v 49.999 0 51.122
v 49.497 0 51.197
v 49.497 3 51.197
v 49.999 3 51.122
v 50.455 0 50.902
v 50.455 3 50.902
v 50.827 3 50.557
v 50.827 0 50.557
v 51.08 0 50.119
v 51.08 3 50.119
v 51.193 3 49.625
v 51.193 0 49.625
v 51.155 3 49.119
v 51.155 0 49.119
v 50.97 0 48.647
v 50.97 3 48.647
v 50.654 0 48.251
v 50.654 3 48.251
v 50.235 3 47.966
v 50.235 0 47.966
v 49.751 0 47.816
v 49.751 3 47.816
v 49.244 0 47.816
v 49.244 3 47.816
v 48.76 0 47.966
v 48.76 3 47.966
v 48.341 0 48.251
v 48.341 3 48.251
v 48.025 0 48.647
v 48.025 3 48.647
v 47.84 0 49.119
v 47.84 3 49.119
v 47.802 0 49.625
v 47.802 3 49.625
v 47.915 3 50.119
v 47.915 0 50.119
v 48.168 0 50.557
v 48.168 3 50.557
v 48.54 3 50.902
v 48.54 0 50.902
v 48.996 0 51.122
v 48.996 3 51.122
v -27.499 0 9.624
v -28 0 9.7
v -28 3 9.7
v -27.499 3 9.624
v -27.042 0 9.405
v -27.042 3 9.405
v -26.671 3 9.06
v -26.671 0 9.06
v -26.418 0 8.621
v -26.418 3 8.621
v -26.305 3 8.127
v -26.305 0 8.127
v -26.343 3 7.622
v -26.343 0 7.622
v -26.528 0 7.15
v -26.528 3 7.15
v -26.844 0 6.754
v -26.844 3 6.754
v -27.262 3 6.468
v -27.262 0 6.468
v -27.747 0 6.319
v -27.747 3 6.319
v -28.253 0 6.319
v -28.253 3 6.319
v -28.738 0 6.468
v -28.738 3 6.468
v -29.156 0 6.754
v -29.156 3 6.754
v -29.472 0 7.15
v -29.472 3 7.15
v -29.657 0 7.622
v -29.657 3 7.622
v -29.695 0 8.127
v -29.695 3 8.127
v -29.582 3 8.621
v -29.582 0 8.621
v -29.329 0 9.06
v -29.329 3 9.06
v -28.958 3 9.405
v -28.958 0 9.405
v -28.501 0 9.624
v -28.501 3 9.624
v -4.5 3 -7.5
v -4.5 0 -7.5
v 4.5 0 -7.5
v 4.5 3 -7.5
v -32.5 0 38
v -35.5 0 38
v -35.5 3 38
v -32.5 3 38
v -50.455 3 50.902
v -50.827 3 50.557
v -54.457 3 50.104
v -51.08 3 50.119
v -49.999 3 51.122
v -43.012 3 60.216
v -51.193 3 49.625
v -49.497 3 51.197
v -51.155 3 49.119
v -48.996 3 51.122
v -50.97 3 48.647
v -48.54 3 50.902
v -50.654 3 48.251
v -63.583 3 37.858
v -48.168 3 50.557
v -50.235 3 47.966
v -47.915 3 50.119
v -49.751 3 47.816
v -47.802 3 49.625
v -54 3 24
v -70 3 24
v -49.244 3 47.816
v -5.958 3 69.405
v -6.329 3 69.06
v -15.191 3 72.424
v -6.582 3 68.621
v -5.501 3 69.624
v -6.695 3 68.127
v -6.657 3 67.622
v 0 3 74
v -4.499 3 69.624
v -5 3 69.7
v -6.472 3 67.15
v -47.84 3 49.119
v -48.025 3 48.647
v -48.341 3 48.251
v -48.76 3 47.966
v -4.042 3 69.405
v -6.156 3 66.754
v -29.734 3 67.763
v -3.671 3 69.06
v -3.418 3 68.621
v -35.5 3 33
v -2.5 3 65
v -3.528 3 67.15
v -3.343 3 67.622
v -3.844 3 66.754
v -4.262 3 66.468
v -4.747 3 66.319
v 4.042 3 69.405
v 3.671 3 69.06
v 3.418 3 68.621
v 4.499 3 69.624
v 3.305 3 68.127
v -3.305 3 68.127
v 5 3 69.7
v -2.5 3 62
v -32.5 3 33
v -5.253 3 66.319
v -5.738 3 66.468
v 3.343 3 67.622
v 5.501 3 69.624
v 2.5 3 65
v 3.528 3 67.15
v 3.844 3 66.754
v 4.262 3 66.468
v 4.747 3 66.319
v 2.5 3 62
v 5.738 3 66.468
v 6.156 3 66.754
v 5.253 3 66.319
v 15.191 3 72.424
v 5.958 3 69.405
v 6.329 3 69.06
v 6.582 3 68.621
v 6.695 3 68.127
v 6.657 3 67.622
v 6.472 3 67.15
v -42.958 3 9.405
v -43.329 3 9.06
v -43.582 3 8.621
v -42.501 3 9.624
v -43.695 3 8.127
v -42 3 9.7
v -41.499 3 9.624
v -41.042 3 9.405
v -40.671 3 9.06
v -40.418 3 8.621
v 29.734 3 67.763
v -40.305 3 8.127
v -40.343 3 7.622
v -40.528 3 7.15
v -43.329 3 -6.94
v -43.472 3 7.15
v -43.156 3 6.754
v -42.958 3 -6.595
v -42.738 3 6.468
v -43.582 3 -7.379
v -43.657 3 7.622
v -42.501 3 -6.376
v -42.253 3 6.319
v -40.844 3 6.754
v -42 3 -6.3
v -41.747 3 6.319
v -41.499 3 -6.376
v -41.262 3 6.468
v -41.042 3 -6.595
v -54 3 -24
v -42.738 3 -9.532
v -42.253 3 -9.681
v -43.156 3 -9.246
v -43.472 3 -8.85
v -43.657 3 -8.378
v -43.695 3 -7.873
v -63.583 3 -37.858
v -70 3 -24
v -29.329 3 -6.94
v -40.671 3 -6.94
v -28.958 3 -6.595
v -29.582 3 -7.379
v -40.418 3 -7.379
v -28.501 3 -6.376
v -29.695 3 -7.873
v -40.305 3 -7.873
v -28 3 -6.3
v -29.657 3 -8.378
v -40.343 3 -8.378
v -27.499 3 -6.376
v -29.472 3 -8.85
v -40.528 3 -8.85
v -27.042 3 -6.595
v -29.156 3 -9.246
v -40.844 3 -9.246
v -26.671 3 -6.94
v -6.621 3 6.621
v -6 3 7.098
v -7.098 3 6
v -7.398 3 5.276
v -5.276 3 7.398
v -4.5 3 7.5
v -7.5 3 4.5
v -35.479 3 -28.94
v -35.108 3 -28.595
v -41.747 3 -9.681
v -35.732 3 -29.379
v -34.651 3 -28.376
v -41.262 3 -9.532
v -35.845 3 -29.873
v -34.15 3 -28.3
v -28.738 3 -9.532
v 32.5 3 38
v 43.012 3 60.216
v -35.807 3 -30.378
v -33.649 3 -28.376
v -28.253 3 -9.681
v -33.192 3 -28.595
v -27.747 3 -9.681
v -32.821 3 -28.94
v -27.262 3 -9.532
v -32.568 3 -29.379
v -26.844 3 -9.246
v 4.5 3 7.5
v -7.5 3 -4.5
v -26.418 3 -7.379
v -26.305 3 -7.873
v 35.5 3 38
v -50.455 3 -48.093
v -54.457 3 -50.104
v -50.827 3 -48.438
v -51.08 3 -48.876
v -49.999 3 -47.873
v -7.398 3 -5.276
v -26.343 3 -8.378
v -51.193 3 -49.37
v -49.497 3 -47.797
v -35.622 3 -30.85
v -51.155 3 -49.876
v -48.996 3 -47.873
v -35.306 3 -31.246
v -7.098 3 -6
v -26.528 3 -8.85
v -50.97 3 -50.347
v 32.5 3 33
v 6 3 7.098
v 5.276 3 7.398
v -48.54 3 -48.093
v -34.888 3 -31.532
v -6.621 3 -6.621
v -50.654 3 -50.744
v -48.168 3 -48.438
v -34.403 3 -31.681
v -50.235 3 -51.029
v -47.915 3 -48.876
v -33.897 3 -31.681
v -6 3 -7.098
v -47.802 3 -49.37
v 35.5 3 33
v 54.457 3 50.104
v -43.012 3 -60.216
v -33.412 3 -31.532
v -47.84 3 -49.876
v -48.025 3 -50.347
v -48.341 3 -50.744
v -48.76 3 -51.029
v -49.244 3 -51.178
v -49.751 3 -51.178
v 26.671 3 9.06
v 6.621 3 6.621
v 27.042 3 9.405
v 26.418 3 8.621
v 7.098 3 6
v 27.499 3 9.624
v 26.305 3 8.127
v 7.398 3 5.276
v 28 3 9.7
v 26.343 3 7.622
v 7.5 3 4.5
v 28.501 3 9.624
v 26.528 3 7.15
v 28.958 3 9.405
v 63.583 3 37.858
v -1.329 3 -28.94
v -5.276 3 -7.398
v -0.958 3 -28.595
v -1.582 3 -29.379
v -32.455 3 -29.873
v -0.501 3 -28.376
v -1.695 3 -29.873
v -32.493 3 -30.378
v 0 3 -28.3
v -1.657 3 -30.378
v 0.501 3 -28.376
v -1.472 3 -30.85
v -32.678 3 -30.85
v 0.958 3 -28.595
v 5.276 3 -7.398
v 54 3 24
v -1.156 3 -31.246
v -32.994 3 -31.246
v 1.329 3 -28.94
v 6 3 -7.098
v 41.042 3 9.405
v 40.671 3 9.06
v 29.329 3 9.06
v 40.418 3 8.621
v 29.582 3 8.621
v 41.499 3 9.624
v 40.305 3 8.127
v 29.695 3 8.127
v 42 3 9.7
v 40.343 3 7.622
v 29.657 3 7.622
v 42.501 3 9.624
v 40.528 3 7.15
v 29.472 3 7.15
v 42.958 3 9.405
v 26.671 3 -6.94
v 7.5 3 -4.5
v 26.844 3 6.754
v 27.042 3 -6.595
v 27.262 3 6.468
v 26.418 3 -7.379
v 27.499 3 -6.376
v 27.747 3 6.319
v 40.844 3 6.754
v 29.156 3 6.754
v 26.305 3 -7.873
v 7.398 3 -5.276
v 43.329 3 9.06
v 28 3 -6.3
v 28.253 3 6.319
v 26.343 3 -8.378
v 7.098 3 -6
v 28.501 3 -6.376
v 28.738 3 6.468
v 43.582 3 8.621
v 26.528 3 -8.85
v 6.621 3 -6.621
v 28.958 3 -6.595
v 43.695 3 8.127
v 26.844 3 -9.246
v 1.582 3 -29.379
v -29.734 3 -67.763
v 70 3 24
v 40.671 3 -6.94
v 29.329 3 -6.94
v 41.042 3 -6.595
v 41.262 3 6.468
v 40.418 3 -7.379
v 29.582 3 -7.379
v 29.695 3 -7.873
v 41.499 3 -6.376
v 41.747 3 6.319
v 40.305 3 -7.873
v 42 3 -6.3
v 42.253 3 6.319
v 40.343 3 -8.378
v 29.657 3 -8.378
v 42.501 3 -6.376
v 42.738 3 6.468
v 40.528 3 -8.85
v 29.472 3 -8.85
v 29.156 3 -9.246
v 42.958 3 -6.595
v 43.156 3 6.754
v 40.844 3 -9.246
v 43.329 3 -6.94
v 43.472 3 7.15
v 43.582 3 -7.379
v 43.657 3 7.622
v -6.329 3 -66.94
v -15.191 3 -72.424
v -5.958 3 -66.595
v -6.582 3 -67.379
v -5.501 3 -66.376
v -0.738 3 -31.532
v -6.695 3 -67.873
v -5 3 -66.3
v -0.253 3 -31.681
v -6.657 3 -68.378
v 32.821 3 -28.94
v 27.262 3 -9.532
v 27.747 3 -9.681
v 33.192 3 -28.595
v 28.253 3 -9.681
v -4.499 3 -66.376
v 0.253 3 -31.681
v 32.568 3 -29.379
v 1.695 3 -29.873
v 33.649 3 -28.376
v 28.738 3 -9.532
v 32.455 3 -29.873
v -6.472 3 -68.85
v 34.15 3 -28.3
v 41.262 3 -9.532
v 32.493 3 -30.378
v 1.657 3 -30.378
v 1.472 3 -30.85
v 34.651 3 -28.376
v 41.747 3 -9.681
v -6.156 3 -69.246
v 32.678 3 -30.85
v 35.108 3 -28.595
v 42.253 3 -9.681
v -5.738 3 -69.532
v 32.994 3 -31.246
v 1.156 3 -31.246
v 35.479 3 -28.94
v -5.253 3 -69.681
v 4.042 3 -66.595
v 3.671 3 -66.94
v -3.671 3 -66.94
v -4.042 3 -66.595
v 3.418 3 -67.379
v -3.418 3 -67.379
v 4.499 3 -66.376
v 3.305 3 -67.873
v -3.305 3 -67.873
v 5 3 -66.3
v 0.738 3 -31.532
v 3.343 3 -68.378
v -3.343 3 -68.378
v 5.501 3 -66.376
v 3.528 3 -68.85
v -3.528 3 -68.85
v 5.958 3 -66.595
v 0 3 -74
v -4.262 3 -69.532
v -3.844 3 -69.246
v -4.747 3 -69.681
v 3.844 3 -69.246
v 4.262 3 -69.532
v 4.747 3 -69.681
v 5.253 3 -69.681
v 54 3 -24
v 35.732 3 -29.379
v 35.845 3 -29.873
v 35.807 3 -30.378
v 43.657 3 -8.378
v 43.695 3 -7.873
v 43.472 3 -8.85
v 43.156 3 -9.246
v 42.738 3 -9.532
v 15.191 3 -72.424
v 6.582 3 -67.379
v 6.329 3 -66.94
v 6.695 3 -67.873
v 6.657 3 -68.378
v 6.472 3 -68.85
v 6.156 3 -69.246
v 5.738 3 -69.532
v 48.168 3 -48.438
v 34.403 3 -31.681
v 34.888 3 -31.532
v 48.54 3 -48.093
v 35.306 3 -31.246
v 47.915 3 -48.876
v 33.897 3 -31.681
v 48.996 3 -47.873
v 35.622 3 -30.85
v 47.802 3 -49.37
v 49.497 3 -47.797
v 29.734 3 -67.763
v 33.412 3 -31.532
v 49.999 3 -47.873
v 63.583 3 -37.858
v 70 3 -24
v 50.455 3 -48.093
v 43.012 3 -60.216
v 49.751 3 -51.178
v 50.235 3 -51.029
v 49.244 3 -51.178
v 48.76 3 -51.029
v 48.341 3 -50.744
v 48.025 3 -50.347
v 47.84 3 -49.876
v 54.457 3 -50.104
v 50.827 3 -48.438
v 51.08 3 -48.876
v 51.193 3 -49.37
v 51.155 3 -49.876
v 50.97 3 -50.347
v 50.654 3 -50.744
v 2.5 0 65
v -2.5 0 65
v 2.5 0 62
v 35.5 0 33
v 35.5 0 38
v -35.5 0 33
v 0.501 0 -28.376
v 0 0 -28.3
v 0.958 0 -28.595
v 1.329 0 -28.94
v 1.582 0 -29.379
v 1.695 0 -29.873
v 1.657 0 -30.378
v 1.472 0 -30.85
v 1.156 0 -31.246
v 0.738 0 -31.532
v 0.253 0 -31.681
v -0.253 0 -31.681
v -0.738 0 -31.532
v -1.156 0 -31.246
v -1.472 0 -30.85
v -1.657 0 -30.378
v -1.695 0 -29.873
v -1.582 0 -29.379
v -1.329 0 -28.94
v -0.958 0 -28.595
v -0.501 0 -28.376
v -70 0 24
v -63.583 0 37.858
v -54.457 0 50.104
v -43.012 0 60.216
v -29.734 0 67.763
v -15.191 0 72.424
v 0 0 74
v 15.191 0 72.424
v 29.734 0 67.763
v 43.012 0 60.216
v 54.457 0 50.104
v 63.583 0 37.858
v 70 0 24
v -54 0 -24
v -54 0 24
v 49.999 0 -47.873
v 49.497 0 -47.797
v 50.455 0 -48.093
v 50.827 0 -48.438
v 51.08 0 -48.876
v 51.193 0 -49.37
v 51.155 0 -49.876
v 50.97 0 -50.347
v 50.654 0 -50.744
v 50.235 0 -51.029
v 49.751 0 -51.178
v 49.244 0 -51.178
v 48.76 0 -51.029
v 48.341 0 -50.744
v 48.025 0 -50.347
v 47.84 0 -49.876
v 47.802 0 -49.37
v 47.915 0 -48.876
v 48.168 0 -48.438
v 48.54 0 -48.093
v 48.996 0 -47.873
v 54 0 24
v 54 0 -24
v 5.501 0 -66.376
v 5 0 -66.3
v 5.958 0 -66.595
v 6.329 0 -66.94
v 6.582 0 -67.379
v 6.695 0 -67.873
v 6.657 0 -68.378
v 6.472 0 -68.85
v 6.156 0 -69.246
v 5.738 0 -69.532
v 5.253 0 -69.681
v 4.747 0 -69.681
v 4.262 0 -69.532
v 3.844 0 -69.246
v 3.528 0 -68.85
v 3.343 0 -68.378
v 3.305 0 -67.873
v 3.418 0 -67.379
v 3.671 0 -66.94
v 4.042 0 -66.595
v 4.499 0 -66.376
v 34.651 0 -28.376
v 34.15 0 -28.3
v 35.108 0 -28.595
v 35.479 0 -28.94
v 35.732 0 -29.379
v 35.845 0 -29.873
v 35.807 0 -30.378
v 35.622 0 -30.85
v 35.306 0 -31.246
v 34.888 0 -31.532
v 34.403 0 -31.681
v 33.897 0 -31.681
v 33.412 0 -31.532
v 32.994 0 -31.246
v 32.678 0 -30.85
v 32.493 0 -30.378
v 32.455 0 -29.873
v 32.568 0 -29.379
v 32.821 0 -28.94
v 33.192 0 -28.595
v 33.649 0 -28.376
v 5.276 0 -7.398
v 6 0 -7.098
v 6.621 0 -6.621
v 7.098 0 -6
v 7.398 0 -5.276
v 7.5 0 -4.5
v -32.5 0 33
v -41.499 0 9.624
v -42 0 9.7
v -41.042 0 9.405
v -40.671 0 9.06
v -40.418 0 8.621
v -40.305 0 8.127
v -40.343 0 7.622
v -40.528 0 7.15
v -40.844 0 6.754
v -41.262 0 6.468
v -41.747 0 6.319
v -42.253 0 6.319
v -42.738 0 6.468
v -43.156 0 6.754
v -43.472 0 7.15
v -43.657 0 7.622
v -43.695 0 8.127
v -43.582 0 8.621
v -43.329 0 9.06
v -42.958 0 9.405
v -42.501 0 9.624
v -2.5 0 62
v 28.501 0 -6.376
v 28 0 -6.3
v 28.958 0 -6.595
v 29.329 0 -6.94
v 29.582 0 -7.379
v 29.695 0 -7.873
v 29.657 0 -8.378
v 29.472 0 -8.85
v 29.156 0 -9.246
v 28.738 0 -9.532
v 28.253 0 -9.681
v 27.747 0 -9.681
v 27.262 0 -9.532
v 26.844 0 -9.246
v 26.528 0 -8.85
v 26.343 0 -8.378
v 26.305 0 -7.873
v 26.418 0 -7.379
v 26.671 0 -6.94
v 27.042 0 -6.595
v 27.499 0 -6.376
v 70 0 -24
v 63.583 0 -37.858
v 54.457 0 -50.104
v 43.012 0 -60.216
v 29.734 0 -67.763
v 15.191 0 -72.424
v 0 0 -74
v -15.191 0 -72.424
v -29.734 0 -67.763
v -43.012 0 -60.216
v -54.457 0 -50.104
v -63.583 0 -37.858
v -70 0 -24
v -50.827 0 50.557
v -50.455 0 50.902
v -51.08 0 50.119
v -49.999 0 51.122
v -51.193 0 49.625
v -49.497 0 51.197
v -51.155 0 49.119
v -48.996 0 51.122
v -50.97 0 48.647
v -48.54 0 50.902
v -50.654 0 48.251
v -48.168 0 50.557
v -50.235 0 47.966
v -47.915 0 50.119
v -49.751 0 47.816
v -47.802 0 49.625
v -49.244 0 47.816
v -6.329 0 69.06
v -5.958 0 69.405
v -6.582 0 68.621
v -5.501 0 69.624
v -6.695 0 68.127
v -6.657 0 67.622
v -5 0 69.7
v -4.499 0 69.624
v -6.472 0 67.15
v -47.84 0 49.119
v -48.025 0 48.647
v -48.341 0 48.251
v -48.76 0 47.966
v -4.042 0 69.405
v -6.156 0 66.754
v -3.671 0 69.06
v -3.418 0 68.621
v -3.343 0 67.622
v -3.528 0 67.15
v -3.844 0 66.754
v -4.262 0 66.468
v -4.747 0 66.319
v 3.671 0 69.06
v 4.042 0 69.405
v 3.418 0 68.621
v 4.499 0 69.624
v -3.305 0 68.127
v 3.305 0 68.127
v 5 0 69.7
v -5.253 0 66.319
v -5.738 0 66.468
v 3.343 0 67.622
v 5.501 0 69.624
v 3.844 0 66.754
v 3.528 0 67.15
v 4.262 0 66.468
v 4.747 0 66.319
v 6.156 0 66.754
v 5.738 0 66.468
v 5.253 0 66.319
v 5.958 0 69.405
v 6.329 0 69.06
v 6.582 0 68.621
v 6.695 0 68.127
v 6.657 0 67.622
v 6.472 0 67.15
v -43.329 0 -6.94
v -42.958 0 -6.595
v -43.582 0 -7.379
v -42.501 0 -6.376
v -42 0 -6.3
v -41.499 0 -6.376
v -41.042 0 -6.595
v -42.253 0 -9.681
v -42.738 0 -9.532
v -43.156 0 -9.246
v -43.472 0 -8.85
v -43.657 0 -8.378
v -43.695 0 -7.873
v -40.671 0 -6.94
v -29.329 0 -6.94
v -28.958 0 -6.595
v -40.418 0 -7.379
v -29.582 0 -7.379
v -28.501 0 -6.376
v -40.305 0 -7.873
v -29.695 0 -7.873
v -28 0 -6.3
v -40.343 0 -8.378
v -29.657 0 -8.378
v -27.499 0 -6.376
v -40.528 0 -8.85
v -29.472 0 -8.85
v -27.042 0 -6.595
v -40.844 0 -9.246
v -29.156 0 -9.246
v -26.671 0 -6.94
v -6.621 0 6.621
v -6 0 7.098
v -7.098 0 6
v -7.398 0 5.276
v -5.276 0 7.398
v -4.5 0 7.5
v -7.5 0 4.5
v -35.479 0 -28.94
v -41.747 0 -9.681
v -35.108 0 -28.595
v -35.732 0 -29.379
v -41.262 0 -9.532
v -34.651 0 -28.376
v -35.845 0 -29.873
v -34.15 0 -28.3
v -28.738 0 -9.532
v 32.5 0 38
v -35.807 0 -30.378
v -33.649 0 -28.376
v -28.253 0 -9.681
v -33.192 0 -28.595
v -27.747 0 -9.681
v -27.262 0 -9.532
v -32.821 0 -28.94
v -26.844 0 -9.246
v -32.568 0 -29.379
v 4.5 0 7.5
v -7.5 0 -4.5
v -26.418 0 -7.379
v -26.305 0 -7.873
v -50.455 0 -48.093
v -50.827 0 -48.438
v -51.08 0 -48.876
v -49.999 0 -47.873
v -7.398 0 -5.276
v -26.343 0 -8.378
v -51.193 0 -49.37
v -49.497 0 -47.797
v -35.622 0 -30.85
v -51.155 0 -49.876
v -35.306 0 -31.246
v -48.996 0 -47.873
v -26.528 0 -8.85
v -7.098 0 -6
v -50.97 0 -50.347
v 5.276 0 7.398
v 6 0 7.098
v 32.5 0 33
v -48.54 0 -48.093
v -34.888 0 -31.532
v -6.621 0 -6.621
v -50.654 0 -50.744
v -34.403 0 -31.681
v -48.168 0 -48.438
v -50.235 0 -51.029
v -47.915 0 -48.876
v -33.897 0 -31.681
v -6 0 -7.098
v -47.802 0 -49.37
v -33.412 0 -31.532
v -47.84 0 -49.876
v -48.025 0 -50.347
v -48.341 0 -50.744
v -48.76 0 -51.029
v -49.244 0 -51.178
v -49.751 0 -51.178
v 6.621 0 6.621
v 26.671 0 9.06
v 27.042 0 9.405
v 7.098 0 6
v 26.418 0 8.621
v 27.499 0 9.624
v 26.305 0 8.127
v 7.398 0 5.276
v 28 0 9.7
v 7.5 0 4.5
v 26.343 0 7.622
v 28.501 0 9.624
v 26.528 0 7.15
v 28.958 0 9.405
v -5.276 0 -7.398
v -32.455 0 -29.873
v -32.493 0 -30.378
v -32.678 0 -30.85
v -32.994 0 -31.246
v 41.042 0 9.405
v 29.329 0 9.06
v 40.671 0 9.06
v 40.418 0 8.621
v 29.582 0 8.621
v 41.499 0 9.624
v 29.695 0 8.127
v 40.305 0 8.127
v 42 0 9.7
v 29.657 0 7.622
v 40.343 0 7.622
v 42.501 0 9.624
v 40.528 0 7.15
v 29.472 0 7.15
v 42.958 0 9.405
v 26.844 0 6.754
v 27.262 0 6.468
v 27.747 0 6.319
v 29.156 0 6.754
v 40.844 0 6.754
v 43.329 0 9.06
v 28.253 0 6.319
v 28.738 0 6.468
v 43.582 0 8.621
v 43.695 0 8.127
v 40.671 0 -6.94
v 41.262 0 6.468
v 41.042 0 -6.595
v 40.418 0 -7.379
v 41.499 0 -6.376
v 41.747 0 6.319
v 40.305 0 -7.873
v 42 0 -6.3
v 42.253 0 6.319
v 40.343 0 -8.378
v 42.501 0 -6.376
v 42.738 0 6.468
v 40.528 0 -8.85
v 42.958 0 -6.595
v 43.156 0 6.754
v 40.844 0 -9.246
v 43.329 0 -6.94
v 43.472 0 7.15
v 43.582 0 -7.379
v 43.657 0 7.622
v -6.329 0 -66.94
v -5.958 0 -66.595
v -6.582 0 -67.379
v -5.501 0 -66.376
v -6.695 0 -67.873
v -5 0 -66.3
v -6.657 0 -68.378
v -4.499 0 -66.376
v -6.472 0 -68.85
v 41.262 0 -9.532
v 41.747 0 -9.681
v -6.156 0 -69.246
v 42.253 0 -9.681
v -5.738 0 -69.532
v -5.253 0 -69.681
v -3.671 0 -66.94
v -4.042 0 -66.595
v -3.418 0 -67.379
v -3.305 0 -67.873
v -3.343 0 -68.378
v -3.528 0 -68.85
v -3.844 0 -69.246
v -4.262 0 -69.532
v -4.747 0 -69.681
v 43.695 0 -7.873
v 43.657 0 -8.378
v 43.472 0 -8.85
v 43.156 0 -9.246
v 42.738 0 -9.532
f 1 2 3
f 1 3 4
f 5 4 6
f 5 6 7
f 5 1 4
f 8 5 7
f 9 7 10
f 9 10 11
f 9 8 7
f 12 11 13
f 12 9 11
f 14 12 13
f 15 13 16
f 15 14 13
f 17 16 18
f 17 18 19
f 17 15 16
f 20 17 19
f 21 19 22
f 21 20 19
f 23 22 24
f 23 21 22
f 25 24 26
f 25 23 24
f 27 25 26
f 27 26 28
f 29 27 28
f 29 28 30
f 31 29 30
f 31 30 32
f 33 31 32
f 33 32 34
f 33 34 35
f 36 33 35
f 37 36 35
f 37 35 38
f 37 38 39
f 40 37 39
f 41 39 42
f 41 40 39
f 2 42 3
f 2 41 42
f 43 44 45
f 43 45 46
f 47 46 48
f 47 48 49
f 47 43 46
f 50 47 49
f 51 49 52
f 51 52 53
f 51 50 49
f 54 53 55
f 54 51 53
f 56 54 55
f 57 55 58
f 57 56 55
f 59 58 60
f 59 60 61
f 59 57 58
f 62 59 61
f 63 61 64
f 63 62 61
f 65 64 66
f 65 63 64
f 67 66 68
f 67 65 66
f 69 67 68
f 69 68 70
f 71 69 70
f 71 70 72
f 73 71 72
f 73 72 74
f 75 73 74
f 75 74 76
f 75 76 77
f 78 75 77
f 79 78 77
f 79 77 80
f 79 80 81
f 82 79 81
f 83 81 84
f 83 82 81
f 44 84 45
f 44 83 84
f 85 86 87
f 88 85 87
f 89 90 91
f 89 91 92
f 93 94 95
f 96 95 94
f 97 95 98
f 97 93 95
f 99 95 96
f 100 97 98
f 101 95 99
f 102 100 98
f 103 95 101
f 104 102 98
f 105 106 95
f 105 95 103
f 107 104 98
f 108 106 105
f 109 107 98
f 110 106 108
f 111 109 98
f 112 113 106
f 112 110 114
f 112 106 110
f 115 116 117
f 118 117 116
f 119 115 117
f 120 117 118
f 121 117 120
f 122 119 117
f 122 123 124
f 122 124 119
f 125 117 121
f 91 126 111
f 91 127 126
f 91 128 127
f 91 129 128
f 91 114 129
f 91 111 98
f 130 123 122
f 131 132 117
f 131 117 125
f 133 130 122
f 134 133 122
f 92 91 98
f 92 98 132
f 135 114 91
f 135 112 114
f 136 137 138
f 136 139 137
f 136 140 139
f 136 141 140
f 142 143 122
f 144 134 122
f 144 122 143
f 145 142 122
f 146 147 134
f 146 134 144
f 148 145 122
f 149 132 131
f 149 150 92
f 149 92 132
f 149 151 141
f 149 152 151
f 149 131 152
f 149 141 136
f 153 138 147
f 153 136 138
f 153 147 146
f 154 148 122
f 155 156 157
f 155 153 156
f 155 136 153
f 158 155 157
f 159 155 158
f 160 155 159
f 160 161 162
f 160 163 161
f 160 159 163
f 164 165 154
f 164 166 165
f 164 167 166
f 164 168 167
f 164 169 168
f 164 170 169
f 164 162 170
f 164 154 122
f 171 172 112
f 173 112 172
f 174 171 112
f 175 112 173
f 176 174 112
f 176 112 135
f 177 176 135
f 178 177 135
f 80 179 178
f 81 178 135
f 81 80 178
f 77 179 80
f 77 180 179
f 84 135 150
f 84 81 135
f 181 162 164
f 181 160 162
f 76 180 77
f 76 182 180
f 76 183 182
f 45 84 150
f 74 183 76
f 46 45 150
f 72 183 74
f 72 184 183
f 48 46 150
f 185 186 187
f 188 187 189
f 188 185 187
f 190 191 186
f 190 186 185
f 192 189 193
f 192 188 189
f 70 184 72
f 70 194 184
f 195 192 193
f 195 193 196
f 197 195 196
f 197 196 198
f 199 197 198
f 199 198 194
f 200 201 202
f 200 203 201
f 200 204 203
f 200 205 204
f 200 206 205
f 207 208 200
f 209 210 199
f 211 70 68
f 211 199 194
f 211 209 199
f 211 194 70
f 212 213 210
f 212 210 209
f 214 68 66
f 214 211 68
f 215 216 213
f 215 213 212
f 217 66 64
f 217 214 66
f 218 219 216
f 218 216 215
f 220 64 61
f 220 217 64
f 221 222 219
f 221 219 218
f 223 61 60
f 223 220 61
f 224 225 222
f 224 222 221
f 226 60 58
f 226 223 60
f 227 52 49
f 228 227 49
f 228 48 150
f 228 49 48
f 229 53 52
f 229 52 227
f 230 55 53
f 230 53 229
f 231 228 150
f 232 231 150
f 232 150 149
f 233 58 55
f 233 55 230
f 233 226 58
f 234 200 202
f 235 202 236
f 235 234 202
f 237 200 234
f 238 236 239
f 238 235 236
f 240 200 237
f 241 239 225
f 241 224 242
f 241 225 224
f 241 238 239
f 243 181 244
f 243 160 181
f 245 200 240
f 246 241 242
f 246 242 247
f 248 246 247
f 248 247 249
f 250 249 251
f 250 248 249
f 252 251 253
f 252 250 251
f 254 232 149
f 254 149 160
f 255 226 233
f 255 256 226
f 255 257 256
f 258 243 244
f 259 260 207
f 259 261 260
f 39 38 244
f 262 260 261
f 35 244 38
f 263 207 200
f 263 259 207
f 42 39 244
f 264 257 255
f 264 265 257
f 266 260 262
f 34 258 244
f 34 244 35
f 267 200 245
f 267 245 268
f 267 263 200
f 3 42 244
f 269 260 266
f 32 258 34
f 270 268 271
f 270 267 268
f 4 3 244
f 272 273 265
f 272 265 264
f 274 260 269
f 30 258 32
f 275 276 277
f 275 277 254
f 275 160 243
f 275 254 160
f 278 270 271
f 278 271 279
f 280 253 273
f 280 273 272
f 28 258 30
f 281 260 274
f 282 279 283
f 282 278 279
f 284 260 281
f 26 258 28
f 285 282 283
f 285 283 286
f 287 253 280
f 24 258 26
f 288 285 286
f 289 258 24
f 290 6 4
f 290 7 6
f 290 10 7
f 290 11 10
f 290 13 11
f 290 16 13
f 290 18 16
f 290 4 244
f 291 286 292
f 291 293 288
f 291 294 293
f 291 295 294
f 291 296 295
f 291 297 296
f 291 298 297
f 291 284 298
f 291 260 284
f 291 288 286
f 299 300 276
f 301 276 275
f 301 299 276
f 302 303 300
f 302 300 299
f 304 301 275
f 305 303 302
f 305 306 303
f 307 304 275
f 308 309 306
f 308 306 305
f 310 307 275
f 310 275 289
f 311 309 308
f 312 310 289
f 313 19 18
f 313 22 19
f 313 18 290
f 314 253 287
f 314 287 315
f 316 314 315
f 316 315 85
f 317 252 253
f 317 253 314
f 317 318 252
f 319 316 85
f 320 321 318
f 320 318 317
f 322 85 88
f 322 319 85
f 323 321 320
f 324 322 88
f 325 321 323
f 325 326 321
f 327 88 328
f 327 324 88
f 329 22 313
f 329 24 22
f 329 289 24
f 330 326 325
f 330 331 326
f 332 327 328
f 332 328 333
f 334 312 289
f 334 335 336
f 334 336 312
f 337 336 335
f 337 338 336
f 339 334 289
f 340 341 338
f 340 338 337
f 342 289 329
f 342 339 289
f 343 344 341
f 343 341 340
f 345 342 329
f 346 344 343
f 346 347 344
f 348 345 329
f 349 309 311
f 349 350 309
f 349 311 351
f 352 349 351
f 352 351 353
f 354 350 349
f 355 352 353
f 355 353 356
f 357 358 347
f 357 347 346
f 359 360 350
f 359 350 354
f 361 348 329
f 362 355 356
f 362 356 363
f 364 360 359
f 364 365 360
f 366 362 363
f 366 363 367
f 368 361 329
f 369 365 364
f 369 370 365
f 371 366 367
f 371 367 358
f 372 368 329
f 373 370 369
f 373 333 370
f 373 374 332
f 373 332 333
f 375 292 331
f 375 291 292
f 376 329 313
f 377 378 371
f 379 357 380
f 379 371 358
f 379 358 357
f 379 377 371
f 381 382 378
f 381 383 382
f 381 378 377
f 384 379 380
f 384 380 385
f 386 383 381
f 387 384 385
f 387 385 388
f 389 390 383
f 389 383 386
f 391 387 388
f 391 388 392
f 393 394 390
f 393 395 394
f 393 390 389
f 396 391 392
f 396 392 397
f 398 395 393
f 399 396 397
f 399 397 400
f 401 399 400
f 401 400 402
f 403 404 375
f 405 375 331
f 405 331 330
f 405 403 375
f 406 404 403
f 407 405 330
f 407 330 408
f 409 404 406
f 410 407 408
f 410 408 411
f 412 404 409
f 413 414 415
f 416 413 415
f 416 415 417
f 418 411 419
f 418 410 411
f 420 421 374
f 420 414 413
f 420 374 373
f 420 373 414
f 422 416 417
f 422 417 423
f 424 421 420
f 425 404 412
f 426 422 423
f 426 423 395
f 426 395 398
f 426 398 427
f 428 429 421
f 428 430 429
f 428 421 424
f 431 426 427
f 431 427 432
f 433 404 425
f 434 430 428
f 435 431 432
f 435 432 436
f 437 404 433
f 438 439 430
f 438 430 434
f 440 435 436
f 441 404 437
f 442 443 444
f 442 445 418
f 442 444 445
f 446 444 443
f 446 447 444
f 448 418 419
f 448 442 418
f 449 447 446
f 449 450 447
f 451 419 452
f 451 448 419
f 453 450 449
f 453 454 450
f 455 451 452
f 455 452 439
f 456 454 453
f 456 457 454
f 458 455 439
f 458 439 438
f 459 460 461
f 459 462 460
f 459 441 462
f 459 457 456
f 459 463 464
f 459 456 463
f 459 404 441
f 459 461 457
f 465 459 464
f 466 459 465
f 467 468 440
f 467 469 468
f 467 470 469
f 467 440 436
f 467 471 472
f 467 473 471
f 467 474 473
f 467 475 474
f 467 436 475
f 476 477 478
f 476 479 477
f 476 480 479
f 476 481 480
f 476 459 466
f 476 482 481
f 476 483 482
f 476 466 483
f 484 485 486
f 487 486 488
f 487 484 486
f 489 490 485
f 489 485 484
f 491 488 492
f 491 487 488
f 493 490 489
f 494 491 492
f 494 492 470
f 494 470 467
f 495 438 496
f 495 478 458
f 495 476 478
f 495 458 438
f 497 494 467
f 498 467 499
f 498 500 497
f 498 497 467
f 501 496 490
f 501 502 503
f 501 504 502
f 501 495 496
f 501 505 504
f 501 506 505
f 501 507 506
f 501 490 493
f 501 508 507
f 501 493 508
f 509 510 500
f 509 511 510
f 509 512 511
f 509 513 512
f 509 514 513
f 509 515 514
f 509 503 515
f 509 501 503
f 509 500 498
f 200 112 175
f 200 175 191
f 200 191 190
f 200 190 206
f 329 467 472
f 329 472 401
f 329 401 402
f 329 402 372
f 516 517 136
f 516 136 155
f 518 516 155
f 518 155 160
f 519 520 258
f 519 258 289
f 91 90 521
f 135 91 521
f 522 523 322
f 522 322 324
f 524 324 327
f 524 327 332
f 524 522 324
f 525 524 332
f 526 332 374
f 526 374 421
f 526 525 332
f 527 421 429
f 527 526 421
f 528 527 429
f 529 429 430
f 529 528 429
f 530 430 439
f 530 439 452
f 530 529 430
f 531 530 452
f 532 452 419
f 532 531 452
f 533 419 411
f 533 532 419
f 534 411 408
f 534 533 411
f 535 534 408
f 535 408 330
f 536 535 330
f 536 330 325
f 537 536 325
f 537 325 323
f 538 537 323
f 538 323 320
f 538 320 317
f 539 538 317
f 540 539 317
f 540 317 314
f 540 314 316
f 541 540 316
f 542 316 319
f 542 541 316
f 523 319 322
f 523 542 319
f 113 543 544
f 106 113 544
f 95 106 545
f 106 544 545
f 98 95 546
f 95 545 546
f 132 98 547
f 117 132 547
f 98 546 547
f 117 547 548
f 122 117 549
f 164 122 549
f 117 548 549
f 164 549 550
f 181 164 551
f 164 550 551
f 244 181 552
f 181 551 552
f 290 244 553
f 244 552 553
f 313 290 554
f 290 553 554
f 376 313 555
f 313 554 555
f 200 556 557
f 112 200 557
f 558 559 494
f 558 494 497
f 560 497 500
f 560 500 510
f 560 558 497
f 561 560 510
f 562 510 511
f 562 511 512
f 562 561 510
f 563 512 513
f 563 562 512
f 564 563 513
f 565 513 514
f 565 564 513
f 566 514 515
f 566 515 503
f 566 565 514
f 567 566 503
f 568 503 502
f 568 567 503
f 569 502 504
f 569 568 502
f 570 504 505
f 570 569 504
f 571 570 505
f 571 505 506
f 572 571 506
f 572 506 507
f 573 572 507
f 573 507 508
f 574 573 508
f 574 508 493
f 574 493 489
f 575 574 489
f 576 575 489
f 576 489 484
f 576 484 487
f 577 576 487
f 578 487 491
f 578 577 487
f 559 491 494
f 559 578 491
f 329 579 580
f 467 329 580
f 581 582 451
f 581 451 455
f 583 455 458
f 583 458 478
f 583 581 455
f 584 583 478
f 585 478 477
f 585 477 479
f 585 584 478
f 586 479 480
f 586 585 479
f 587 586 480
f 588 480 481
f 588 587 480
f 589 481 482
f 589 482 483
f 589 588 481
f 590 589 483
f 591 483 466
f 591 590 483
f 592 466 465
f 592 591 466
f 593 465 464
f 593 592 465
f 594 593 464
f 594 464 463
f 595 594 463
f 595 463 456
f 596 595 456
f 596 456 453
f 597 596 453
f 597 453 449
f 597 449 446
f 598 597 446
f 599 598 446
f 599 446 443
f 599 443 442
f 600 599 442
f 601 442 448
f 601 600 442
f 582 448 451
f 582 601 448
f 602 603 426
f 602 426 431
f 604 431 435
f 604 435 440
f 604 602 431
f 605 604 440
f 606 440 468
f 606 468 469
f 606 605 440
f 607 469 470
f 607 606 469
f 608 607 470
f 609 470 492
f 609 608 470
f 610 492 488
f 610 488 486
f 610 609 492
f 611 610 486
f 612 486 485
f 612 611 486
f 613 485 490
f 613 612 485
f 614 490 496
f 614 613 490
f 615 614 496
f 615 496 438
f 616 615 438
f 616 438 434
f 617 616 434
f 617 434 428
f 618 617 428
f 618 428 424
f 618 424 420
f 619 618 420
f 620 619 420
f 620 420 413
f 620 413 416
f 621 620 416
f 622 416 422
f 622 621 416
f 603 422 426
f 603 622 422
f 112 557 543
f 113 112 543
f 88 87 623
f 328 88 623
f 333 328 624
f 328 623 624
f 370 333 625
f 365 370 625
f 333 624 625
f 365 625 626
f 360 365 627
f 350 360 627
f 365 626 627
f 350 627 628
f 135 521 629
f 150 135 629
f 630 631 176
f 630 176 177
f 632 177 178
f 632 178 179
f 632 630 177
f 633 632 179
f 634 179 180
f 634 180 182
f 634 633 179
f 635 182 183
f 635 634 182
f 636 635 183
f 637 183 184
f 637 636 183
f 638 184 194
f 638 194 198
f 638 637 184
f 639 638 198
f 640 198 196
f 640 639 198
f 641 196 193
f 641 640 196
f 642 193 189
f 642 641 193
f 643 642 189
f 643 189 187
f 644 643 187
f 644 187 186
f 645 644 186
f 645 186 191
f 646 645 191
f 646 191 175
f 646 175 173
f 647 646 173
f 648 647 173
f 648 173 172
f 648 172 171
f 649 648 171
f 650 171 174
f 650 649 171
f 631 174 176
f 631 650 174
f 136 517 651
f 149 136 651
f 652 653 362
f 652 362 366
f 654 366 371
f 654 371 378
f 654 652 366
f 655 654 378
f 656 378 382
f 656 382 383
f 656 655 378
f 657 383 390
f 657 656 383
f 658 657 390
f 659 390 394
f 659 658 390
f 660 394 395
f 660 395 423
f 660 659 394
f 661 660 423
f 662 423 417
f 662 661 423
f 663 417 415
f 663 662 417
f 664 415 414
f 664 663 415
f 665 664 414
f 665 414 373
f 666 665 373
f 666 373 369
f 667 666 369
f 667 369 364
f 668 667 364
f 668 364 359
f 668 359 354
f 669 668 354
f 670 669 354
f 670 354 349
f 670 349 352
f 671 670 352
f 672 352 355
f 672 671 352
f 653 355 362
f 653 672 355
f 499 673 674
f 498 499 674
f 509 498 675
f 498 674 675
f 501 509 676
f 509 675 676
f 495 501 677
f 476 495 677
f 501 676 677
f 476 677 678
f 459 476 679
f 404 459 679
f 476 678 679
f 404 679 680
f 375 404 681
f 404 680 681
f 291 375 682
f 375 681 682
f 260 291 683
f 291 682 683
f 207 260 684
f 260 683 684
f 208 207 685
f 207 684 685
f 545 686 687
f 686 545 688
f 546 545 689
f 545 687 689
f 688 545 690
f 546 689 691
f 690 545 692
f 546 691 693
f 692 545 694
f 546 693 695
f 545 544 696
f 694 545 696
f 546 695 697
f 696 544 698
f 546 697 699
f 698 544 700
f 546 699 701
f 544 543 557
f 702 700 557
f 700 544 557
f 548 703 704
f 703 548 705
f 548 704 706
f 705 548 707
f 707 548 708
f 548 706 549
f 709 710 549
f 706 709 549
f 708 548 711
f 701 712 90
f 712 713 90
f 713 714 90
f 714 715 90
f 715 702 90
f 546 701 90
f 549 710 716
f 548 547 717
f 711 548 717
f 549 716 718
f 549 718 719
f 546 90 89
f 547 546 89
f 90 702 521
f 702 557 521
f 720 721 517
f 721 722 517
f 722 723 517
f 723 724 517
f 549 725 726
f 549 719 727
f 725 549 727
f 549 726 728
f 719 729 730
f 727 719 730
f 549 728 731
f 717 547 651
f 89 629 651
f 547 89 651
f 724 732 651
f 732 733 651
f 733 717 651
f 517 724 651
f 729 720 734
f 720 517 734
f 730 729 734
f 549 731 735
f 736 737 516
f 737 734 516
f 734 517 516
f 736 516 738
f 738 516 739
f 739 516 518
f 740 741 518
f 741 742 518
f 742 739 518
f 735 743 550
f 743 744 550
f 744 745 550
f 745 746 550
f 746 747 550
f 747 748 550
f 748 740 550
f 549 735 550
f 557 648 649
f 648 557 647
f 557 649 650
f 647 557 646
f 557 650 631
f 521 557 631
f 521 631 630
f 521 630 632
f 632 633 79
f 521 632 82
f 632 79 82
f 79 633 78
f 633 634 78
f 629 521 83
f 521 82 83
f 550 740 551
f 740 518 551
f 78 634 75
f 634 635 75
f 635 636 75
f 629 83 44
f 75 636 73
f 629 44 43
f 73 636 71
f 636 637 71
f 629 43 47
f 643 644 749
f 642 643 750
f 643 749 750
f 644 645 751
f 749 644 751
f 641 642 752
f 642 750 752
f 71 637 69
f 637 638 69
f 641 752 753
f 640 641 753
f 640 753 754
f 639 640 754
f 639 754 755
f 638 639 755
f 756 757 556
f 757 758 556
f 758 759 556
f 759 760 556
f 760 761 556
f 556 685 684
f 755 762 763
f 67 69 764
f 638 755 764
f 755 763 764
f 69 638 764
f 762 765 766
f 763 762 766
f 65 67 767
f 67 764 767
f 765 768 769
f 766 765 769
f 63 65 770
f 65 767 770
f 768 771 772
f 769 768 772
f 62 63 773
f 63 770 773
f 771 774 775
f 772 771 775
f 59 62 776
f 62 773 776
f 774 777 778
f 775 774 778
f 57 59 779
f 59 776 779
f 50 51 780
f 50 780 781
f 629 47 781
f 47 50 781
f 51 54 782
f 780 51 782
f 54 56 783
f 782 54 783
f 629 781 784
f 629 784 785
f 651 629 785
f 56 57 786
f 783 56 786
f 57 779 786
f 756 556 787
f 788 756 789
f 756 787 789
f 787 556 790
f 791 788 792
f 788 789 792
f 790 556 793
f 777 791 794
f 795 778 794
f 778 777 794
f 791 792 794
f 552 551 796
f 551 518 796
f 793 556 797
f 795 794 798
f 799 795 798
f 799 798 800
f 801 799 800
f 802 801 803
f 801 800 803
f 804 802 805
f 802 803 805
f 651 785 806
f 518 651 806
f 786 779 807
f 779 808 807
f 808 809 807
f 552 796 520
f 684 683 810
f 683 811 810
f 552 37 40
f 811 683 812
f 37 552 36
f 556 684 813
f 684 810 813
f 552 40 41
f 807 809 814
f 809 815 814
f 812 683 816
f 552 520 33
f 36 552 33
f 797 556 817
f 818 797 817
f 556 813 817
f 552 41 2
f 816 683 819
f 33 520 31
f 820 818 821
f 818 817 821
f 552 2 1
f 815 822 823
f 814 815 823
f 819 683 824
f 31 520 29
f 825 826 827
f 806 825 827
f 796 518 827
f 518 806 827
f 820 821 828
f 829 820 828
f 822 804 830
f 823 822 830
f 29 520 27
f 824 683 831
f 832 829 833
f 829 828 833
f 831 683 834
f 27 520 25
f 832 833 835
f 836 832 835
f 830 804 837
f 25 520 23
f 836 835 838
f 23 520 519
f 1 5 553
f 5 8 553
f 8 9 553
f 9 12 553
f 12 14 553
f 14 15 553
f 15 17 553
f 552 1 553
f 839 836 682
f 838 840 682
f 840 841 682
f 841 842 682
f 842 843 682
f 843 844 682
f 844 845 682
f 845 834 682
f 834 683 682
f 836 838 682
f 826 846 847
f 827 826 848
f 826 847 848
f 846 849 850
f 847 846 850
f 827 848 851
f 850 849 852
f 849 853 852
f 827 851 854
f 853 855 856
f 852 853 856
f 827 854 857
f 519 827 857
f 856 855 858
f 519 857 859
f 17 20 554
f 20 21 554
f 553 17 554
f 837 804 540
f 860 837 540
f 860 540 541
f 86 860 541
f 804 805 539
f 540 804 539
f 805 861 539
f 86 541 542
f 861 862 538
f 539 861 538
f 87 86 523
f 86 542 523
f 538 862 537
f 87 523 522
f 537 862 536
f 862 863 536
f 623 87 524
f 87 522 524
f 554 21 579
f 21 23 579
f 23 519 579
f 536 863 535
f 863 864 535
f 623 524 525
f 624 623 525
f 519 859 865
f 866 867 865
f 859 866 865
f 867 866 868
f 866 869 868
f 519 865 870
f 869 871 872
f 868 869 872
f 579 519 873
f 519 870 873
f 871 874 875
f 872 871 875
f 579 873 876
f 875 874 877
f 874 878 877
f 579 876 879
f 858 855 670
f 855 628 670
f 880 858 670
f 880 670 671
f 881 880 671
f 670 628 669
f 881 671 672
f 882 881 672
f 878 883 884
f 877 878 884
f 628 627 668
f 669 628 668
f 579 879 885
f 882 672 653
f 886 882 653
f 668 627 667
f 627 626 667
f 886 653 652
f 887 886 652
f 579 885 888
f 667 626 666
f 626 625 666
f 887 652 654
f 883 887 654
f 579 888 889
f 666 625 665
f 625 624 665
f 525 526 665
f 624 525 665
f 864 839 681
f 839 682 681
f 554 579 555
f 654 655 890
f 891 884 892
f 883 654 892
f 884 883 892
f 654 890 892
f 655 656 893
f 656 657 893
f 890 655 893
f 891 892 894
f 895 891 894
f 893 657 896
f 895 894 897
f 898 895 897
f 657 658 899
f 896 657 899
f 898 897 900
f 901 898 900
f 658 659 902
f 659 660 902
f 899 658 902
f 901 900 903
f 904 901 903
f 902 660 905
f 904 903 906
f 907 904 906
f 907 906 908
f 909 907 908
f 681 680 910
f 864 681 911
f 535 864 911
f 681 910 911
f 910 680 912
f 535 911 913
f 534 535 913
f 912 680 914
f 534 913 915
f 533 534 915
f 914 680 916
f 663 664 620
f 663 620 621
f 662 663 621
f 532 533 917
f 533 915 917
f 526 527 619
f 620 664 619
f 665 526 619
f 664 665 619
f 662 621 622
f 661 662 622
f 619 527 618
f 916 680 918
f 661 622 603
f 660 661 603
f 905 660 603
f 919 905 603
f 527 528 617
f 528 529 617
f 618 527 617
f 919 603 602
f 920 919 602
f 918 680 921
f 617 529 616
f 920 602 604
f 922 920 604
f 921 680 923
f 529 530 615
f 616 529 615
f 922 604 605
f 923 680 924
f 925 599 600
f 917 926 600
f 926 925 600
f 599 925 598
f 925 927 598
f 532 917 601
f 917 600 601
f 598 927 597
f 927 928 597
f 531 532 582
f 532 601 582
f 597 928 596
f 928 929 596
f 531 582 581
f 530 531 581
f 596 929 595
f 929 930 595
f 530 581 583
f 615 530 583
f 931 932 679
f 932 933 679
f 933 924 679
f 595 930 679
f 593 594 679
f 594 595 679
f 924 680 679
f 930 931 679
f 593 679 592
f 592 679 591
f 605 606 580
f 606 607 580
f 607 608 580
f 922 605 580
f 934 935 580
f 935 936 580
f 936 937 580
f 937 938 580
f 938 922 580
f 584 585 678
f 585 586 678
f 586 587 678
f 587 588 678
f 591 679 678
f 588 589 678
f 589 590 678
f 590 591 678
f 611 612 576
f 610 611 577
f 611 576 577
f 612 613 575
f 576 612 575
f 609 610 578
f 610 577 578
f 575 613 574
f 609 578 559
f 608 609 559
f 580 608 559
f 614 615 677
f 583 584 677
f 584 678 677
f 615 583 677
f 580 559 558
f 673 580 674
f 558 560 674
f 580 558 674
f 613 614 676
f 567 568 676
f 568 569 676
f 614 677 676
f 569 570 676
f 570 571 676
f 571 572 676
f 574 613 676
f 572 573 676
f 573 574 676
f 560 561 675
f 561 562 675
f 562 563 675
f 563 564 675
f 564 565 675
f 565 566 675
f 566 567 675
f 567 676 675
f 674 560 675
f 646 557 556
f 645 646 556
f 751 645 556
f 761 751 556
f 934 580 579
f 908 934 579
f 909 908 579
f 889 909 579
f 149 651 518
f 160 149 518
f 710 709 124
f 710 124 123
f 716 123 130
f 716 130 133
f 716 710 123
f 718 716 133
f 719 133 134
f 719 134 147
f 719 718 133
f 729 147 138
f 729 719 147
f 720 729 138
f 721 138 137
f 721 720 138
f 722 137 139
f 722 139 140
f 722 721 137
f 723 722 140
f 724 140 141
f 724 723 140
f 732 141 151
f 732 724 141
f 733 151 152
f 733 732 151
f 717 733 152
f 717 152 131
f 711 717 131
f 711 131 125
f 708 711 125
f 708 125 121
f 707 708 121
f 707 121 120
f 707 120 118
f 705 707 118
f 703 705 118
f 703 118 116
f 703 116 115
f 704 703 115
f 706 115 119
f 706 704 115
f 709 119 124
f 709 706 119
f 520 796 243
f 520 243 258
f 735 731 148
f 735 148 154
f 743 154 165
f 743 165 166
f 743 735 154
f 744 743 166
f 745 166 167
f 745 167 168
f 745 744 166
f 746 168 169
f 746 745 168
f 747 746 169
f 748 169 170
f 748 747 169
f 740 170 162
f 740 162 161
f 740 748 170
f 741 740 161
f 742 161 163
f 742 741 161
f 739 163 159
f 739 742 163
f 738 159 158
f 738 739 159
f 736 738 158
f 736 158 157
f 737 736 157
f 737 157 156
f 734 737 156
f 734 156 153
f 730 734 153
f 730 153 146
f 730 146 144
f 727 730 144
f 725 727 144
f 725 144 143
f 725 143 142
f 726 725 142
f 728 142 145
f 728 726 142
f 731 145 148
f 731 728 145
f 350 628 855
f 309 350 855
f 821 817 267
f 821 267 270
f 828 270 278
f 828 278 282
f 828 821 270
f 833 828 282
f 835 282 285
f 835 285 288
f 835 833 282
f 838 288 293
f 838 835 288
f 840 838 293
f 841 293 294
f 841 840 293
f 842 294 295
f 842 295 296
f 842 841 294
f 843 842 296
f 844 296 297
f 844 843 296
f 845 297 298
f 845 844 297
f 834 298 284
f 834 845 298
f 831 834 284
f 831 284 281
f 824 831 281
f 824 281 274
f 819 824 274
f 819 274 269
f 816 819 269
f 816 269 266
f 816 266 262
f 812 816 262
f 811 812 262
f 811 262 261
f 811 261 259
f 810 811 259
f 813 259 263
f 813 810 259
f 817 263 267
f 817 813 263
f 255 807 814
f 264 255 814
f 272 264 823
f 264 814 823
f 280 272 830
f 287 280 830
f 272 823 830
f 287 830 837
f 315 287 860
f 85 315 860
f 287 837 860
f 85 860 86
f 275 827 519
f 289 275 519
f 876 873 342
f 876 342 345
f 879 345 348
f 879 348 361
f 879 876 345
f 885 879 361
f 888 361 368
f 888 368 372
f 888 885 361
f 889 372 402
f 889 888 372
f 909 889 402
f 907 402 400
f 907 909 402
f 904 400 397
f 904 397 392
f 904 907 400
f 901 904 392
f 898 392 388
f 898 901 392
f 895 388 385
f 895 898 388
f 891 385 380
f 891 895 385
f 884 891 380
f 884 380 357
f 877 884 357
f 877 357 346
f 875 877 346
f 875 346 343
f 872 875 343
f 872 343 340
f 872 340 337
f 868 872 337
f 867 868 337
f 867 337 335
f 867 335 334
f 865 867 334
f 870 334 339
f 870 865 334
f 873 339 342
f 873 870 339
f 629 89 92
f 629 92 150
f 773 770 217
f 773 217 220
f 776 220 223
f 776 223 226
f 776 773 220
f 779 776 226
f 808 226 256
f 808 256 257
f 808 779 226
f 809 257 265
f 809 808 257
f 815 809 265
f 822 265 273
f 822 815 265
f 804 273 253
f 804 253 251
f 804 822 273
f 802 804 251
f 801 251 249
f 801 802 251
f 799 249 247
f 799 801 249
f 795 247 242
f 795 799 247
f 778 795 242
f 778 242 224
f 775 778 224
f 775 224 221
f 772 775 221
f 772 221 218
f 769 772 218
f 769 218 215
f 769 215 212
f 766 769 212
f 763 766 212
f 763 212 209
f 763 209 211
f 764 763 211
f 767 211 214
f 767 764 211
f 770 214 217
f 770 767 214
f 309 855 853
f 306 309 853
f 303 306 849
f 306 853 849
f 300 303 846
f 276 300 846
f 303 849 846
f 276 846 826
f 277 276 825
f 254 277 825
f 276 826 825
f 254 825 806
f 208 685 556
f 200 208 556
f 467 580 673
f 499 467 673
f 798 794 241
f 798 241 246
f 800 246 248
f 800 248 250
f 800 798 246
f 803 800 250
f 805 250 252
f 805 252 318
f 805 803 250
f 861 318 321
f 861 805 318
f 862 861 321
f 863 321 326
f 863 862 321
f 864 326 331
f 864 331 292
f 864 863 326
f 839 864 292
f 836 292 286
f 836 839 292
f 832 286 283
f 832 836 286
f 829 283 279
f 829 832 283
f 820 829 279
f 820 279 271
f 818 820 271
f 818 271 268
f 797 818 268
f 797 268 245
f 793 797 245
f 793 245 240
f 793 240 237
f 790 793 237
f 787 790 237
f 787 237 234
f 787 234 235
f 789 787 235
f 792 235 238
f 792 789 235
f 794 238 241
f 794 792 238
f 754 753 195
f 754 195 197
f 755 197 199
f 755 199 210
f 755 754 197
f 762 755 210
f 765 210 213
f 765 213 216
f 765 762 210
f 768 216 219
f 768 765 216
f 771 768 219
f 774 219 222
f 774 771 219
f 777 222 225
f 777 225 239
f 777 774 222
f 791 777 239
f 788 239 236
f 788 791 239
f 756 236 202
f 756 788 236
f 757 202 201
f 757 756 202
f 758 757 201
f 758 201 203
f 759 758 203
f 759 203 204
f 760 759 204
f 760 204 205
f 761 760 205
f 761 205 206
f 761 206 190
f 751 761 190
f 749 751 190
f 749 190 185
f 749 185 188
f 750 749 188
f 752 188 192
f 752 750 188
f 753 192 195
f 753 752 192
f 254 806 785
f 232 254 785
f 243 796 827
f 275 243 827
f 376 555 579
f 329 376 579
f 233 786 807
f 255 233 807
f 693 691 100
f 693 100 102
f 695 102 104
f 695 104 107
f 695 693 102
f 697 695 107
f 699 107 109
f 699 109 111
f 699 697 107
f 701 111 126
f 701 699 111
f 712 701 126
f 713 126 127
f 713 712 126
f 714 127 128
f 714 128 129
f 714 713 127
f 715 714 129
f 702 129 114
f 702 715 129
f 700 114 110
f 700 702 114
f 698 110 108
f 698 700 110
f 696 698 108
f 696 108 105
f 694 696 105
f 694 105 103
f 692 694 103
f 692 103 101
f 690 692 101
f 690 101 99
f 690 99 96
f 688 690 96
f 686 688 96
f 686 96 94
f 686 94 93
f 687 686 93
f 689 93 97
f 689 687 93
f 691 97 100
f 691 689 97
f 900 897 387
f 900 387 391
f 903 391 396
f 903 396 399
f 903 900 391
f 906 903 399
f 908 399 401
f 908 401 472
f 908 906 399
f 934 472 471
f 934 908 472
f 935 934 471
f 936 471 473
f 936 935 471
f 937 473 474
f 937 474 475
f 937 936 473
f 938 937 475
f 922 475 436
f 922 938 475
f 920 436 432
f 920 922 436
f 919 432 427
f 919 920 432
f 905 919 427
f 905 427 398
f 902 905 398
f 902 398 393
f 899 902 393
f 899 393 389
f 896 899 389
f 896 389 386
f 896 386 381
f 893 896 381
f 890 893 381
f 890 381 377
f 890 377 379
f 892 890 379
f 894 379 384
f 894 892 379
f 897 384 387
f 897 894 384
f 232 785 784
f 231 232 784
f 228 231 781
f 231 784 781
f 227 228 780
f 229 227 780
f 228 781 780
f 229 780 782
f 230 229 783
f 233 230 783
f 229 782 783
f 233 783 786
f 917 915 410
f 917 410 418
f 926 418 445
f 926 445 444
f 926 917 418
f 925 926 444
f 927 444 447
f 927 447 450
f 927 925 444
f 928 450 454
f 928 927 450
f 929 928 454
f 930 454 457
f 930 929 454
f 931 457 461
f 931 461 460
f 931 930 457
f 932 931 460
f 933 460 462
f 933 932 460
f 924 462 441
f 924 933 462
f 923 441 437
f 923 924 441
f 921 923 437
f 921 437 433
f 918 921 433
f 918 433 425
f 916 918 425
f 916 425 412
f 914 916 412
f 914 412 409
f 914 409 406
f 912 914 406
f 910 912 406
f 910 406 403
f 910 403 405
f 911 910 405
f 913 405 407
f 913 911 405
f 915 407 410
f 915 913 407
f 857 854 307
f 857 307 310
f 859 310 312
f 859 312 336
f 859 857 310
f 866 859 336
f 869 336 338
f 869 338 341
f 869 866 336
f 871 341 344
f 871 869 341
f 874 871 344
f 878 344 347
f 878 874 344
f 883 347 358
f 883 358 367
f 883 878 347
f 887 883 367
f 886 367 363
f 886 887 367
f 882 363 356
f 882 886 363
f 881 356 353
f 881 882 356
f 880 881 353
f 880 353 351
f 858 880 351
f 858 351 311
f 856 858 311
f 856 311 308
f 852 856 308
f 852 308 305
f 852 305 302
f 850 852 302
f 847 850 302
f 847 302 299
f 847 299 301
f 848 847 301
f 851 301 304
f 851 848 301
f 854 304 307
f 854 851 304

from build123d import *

# Parameters (mm, degrees)
SKETCH_1_R      = 1.7
SKETCH_1_W      = 3
SKETCH_1_H      = 5
SKETCH_1_W_2    = 5
SKETCH_1_H_2    = 3
EXTRUDE_1_DEPTH = 3


with BuildPart() as part:
    # 草图1 → 凸台-拉伸1 (new body)
    with BuildSketch(Plane(origin=(0, 0, 0), x_dir=(1, 0, 0), z_dir=(0, 1, 0))):
        with BuildLine():
            Line((54, 24), (70, 24))
            ThreePointArc((70, 24), (0, 74), (-70, 24))
            Line((-70, 24), (-54, 24))
            Line((-54, 24), (-54, -24))
            Line((-54, -24), (-70, -24))
            ThreePointArc((-70, -24), (0, -74), (70, -24))
            Line((70, -24), (54, -24))
            Line((54, -24), (54, 24))
        make_face()
        with Locations(Location((-49.497474683, -49.497474683, 0), (0, 0, 270))):
            Circle(SKETCH_1_R, mode=Mode.SUBTRACT)
        with Locations(Location((-5, -68, 0), (0, 0, 270))):
            Circle(SKETCH_1_R, mode=Mode.SUBTRACT)
        with Locations(Location((-42, -8, 0), (0, 0, 270))):
            Circle(SKETCH_1_R, mode=Mode.SUBTRACT)
        with Locations((-34, -35.5)):
            Rectangle(SKETCH_1_W, SKETCH_1_H, mode=Mode.SUBTRACT)
        with Locations(Location((-28, -8, 0), (0, 0, 270))):
            Circle(SKETCH_1_R, mode=Mode.SUBTRACT)
        with Locations(Location((5, -68, 0), (0, 0, 270))):
            Circle(SKETCH_1_R, mode=Mode.SUBTRACT)
        with Locations((0, -63.5)):
            Rectangle(SKETCH_1_W_2, SKETCH_1_H_2, mode=Mode.SUBTRACT)
        with Locations(Location((49.497474683, -49.497474683, 0), (0, 0, 270))):
            Circle(SKETCH_1_R, mode=Mode.SUBTRACT)
        with Locations((34, -35.5)):
            Rectangle(SKETCH_1_W, SKETCH_1_H, mode=Mode.SUBTRACT)
        with Locations(Location((28, -8, 0), (0, 0, 270))):
            Circle(SKETCH_1_R, mode=Mode.SUBTRACT)
        with Locations(Location((42, -8, 0), (0, 0, 270))):
            Circle(SKETCH_1_R, mode=Mode.SUBTRACT)
        with Locations(Location((-42, 8, 0), (0, 0, 270))):
            Circle(SKETCH_1_R, mode=Mode.SUBTRACT)
        with Locations(Location((-28, 8, 0), (0, 0, 270))):
            Circle(SKETCH_1_R, mode=Mode.SUBTRACT)
        with Locations(Location((-34.15, 30, 0), (0, 0, 270))):
            Circle(SKETCH_1_R, mode=Mode.SUBTRACT)
        with Locations(Location((0, 30, 0), (0, 0, 270))):
            Circle(SKETCH_1_R, mode=Mode.SUBTRACT)
        with Locations(Location((-49.497474683, 49.497474683, 0), (0, 0, 270))):
            Circle(SKETCH_1_R, mode=Mode.SUBTRACT)
        with Locations(Location((-5, 68, 0), (0, 0, 270))):
            Circle(SKETCH_1_R, mode=Mode.SUBTRACT)
        with BuildLine():
            Line((4.5, -7.5), (-4.5, -7.5))
            ThreePointArc((-4.5, -7.5), (-6.621320344, -6.621320344), (-7.5, -4.5))
            Line((-7.5, -4.5), (-7.5, 4.5))
            ThreePointArc((-7.5, 4.5), (-6.621320344, 6.621320344), (-4.5, 7.5))
            Line((-4.5, 7.5), (4.5, 7.5))
            ThreePointArc((4.5, 7.5), (6.621320344, 6.621320344), (7.5, 4.5))
            Line((7.5, 4.5), (7.5, -4.5))
            ThreePointArc((7.5, -4.5), (6.621320344, -6.621320344), (4.5, -7.5))
        make_face(mode=Mode.SUBTRACT)
        with Locations(Location((28, 8, 0), (0, 0, 270))):
            Circle(SKETCH_1_R, mode=Mode.SUBTRACT)
        with Locations(Location((34.15, 30, 0), (0, 0, 270))):
            Circle(SKETCH_1_R, mode=Mode.SUBTRACT)
        with Locations(Location((42, 8, 0), (0, 0, 270))):
            Circle(SKETCH_1_R, mode=Mode.SUBTRACT)
        with Locations(Location((5, 68, 0), (0, 0, 270))):
            Circle(SKETCH_1_R, mode=Mode.SUBTRACT)
        with Locations(Location((49.497474683, 49.497474683, 0), (0, 0, 270))):
            Circle(SKETCH_1_R, mode=Mode.SUBTRACT)
    extrude(amount=EXTRUDE_1_DEPTH)


solid = part.part
